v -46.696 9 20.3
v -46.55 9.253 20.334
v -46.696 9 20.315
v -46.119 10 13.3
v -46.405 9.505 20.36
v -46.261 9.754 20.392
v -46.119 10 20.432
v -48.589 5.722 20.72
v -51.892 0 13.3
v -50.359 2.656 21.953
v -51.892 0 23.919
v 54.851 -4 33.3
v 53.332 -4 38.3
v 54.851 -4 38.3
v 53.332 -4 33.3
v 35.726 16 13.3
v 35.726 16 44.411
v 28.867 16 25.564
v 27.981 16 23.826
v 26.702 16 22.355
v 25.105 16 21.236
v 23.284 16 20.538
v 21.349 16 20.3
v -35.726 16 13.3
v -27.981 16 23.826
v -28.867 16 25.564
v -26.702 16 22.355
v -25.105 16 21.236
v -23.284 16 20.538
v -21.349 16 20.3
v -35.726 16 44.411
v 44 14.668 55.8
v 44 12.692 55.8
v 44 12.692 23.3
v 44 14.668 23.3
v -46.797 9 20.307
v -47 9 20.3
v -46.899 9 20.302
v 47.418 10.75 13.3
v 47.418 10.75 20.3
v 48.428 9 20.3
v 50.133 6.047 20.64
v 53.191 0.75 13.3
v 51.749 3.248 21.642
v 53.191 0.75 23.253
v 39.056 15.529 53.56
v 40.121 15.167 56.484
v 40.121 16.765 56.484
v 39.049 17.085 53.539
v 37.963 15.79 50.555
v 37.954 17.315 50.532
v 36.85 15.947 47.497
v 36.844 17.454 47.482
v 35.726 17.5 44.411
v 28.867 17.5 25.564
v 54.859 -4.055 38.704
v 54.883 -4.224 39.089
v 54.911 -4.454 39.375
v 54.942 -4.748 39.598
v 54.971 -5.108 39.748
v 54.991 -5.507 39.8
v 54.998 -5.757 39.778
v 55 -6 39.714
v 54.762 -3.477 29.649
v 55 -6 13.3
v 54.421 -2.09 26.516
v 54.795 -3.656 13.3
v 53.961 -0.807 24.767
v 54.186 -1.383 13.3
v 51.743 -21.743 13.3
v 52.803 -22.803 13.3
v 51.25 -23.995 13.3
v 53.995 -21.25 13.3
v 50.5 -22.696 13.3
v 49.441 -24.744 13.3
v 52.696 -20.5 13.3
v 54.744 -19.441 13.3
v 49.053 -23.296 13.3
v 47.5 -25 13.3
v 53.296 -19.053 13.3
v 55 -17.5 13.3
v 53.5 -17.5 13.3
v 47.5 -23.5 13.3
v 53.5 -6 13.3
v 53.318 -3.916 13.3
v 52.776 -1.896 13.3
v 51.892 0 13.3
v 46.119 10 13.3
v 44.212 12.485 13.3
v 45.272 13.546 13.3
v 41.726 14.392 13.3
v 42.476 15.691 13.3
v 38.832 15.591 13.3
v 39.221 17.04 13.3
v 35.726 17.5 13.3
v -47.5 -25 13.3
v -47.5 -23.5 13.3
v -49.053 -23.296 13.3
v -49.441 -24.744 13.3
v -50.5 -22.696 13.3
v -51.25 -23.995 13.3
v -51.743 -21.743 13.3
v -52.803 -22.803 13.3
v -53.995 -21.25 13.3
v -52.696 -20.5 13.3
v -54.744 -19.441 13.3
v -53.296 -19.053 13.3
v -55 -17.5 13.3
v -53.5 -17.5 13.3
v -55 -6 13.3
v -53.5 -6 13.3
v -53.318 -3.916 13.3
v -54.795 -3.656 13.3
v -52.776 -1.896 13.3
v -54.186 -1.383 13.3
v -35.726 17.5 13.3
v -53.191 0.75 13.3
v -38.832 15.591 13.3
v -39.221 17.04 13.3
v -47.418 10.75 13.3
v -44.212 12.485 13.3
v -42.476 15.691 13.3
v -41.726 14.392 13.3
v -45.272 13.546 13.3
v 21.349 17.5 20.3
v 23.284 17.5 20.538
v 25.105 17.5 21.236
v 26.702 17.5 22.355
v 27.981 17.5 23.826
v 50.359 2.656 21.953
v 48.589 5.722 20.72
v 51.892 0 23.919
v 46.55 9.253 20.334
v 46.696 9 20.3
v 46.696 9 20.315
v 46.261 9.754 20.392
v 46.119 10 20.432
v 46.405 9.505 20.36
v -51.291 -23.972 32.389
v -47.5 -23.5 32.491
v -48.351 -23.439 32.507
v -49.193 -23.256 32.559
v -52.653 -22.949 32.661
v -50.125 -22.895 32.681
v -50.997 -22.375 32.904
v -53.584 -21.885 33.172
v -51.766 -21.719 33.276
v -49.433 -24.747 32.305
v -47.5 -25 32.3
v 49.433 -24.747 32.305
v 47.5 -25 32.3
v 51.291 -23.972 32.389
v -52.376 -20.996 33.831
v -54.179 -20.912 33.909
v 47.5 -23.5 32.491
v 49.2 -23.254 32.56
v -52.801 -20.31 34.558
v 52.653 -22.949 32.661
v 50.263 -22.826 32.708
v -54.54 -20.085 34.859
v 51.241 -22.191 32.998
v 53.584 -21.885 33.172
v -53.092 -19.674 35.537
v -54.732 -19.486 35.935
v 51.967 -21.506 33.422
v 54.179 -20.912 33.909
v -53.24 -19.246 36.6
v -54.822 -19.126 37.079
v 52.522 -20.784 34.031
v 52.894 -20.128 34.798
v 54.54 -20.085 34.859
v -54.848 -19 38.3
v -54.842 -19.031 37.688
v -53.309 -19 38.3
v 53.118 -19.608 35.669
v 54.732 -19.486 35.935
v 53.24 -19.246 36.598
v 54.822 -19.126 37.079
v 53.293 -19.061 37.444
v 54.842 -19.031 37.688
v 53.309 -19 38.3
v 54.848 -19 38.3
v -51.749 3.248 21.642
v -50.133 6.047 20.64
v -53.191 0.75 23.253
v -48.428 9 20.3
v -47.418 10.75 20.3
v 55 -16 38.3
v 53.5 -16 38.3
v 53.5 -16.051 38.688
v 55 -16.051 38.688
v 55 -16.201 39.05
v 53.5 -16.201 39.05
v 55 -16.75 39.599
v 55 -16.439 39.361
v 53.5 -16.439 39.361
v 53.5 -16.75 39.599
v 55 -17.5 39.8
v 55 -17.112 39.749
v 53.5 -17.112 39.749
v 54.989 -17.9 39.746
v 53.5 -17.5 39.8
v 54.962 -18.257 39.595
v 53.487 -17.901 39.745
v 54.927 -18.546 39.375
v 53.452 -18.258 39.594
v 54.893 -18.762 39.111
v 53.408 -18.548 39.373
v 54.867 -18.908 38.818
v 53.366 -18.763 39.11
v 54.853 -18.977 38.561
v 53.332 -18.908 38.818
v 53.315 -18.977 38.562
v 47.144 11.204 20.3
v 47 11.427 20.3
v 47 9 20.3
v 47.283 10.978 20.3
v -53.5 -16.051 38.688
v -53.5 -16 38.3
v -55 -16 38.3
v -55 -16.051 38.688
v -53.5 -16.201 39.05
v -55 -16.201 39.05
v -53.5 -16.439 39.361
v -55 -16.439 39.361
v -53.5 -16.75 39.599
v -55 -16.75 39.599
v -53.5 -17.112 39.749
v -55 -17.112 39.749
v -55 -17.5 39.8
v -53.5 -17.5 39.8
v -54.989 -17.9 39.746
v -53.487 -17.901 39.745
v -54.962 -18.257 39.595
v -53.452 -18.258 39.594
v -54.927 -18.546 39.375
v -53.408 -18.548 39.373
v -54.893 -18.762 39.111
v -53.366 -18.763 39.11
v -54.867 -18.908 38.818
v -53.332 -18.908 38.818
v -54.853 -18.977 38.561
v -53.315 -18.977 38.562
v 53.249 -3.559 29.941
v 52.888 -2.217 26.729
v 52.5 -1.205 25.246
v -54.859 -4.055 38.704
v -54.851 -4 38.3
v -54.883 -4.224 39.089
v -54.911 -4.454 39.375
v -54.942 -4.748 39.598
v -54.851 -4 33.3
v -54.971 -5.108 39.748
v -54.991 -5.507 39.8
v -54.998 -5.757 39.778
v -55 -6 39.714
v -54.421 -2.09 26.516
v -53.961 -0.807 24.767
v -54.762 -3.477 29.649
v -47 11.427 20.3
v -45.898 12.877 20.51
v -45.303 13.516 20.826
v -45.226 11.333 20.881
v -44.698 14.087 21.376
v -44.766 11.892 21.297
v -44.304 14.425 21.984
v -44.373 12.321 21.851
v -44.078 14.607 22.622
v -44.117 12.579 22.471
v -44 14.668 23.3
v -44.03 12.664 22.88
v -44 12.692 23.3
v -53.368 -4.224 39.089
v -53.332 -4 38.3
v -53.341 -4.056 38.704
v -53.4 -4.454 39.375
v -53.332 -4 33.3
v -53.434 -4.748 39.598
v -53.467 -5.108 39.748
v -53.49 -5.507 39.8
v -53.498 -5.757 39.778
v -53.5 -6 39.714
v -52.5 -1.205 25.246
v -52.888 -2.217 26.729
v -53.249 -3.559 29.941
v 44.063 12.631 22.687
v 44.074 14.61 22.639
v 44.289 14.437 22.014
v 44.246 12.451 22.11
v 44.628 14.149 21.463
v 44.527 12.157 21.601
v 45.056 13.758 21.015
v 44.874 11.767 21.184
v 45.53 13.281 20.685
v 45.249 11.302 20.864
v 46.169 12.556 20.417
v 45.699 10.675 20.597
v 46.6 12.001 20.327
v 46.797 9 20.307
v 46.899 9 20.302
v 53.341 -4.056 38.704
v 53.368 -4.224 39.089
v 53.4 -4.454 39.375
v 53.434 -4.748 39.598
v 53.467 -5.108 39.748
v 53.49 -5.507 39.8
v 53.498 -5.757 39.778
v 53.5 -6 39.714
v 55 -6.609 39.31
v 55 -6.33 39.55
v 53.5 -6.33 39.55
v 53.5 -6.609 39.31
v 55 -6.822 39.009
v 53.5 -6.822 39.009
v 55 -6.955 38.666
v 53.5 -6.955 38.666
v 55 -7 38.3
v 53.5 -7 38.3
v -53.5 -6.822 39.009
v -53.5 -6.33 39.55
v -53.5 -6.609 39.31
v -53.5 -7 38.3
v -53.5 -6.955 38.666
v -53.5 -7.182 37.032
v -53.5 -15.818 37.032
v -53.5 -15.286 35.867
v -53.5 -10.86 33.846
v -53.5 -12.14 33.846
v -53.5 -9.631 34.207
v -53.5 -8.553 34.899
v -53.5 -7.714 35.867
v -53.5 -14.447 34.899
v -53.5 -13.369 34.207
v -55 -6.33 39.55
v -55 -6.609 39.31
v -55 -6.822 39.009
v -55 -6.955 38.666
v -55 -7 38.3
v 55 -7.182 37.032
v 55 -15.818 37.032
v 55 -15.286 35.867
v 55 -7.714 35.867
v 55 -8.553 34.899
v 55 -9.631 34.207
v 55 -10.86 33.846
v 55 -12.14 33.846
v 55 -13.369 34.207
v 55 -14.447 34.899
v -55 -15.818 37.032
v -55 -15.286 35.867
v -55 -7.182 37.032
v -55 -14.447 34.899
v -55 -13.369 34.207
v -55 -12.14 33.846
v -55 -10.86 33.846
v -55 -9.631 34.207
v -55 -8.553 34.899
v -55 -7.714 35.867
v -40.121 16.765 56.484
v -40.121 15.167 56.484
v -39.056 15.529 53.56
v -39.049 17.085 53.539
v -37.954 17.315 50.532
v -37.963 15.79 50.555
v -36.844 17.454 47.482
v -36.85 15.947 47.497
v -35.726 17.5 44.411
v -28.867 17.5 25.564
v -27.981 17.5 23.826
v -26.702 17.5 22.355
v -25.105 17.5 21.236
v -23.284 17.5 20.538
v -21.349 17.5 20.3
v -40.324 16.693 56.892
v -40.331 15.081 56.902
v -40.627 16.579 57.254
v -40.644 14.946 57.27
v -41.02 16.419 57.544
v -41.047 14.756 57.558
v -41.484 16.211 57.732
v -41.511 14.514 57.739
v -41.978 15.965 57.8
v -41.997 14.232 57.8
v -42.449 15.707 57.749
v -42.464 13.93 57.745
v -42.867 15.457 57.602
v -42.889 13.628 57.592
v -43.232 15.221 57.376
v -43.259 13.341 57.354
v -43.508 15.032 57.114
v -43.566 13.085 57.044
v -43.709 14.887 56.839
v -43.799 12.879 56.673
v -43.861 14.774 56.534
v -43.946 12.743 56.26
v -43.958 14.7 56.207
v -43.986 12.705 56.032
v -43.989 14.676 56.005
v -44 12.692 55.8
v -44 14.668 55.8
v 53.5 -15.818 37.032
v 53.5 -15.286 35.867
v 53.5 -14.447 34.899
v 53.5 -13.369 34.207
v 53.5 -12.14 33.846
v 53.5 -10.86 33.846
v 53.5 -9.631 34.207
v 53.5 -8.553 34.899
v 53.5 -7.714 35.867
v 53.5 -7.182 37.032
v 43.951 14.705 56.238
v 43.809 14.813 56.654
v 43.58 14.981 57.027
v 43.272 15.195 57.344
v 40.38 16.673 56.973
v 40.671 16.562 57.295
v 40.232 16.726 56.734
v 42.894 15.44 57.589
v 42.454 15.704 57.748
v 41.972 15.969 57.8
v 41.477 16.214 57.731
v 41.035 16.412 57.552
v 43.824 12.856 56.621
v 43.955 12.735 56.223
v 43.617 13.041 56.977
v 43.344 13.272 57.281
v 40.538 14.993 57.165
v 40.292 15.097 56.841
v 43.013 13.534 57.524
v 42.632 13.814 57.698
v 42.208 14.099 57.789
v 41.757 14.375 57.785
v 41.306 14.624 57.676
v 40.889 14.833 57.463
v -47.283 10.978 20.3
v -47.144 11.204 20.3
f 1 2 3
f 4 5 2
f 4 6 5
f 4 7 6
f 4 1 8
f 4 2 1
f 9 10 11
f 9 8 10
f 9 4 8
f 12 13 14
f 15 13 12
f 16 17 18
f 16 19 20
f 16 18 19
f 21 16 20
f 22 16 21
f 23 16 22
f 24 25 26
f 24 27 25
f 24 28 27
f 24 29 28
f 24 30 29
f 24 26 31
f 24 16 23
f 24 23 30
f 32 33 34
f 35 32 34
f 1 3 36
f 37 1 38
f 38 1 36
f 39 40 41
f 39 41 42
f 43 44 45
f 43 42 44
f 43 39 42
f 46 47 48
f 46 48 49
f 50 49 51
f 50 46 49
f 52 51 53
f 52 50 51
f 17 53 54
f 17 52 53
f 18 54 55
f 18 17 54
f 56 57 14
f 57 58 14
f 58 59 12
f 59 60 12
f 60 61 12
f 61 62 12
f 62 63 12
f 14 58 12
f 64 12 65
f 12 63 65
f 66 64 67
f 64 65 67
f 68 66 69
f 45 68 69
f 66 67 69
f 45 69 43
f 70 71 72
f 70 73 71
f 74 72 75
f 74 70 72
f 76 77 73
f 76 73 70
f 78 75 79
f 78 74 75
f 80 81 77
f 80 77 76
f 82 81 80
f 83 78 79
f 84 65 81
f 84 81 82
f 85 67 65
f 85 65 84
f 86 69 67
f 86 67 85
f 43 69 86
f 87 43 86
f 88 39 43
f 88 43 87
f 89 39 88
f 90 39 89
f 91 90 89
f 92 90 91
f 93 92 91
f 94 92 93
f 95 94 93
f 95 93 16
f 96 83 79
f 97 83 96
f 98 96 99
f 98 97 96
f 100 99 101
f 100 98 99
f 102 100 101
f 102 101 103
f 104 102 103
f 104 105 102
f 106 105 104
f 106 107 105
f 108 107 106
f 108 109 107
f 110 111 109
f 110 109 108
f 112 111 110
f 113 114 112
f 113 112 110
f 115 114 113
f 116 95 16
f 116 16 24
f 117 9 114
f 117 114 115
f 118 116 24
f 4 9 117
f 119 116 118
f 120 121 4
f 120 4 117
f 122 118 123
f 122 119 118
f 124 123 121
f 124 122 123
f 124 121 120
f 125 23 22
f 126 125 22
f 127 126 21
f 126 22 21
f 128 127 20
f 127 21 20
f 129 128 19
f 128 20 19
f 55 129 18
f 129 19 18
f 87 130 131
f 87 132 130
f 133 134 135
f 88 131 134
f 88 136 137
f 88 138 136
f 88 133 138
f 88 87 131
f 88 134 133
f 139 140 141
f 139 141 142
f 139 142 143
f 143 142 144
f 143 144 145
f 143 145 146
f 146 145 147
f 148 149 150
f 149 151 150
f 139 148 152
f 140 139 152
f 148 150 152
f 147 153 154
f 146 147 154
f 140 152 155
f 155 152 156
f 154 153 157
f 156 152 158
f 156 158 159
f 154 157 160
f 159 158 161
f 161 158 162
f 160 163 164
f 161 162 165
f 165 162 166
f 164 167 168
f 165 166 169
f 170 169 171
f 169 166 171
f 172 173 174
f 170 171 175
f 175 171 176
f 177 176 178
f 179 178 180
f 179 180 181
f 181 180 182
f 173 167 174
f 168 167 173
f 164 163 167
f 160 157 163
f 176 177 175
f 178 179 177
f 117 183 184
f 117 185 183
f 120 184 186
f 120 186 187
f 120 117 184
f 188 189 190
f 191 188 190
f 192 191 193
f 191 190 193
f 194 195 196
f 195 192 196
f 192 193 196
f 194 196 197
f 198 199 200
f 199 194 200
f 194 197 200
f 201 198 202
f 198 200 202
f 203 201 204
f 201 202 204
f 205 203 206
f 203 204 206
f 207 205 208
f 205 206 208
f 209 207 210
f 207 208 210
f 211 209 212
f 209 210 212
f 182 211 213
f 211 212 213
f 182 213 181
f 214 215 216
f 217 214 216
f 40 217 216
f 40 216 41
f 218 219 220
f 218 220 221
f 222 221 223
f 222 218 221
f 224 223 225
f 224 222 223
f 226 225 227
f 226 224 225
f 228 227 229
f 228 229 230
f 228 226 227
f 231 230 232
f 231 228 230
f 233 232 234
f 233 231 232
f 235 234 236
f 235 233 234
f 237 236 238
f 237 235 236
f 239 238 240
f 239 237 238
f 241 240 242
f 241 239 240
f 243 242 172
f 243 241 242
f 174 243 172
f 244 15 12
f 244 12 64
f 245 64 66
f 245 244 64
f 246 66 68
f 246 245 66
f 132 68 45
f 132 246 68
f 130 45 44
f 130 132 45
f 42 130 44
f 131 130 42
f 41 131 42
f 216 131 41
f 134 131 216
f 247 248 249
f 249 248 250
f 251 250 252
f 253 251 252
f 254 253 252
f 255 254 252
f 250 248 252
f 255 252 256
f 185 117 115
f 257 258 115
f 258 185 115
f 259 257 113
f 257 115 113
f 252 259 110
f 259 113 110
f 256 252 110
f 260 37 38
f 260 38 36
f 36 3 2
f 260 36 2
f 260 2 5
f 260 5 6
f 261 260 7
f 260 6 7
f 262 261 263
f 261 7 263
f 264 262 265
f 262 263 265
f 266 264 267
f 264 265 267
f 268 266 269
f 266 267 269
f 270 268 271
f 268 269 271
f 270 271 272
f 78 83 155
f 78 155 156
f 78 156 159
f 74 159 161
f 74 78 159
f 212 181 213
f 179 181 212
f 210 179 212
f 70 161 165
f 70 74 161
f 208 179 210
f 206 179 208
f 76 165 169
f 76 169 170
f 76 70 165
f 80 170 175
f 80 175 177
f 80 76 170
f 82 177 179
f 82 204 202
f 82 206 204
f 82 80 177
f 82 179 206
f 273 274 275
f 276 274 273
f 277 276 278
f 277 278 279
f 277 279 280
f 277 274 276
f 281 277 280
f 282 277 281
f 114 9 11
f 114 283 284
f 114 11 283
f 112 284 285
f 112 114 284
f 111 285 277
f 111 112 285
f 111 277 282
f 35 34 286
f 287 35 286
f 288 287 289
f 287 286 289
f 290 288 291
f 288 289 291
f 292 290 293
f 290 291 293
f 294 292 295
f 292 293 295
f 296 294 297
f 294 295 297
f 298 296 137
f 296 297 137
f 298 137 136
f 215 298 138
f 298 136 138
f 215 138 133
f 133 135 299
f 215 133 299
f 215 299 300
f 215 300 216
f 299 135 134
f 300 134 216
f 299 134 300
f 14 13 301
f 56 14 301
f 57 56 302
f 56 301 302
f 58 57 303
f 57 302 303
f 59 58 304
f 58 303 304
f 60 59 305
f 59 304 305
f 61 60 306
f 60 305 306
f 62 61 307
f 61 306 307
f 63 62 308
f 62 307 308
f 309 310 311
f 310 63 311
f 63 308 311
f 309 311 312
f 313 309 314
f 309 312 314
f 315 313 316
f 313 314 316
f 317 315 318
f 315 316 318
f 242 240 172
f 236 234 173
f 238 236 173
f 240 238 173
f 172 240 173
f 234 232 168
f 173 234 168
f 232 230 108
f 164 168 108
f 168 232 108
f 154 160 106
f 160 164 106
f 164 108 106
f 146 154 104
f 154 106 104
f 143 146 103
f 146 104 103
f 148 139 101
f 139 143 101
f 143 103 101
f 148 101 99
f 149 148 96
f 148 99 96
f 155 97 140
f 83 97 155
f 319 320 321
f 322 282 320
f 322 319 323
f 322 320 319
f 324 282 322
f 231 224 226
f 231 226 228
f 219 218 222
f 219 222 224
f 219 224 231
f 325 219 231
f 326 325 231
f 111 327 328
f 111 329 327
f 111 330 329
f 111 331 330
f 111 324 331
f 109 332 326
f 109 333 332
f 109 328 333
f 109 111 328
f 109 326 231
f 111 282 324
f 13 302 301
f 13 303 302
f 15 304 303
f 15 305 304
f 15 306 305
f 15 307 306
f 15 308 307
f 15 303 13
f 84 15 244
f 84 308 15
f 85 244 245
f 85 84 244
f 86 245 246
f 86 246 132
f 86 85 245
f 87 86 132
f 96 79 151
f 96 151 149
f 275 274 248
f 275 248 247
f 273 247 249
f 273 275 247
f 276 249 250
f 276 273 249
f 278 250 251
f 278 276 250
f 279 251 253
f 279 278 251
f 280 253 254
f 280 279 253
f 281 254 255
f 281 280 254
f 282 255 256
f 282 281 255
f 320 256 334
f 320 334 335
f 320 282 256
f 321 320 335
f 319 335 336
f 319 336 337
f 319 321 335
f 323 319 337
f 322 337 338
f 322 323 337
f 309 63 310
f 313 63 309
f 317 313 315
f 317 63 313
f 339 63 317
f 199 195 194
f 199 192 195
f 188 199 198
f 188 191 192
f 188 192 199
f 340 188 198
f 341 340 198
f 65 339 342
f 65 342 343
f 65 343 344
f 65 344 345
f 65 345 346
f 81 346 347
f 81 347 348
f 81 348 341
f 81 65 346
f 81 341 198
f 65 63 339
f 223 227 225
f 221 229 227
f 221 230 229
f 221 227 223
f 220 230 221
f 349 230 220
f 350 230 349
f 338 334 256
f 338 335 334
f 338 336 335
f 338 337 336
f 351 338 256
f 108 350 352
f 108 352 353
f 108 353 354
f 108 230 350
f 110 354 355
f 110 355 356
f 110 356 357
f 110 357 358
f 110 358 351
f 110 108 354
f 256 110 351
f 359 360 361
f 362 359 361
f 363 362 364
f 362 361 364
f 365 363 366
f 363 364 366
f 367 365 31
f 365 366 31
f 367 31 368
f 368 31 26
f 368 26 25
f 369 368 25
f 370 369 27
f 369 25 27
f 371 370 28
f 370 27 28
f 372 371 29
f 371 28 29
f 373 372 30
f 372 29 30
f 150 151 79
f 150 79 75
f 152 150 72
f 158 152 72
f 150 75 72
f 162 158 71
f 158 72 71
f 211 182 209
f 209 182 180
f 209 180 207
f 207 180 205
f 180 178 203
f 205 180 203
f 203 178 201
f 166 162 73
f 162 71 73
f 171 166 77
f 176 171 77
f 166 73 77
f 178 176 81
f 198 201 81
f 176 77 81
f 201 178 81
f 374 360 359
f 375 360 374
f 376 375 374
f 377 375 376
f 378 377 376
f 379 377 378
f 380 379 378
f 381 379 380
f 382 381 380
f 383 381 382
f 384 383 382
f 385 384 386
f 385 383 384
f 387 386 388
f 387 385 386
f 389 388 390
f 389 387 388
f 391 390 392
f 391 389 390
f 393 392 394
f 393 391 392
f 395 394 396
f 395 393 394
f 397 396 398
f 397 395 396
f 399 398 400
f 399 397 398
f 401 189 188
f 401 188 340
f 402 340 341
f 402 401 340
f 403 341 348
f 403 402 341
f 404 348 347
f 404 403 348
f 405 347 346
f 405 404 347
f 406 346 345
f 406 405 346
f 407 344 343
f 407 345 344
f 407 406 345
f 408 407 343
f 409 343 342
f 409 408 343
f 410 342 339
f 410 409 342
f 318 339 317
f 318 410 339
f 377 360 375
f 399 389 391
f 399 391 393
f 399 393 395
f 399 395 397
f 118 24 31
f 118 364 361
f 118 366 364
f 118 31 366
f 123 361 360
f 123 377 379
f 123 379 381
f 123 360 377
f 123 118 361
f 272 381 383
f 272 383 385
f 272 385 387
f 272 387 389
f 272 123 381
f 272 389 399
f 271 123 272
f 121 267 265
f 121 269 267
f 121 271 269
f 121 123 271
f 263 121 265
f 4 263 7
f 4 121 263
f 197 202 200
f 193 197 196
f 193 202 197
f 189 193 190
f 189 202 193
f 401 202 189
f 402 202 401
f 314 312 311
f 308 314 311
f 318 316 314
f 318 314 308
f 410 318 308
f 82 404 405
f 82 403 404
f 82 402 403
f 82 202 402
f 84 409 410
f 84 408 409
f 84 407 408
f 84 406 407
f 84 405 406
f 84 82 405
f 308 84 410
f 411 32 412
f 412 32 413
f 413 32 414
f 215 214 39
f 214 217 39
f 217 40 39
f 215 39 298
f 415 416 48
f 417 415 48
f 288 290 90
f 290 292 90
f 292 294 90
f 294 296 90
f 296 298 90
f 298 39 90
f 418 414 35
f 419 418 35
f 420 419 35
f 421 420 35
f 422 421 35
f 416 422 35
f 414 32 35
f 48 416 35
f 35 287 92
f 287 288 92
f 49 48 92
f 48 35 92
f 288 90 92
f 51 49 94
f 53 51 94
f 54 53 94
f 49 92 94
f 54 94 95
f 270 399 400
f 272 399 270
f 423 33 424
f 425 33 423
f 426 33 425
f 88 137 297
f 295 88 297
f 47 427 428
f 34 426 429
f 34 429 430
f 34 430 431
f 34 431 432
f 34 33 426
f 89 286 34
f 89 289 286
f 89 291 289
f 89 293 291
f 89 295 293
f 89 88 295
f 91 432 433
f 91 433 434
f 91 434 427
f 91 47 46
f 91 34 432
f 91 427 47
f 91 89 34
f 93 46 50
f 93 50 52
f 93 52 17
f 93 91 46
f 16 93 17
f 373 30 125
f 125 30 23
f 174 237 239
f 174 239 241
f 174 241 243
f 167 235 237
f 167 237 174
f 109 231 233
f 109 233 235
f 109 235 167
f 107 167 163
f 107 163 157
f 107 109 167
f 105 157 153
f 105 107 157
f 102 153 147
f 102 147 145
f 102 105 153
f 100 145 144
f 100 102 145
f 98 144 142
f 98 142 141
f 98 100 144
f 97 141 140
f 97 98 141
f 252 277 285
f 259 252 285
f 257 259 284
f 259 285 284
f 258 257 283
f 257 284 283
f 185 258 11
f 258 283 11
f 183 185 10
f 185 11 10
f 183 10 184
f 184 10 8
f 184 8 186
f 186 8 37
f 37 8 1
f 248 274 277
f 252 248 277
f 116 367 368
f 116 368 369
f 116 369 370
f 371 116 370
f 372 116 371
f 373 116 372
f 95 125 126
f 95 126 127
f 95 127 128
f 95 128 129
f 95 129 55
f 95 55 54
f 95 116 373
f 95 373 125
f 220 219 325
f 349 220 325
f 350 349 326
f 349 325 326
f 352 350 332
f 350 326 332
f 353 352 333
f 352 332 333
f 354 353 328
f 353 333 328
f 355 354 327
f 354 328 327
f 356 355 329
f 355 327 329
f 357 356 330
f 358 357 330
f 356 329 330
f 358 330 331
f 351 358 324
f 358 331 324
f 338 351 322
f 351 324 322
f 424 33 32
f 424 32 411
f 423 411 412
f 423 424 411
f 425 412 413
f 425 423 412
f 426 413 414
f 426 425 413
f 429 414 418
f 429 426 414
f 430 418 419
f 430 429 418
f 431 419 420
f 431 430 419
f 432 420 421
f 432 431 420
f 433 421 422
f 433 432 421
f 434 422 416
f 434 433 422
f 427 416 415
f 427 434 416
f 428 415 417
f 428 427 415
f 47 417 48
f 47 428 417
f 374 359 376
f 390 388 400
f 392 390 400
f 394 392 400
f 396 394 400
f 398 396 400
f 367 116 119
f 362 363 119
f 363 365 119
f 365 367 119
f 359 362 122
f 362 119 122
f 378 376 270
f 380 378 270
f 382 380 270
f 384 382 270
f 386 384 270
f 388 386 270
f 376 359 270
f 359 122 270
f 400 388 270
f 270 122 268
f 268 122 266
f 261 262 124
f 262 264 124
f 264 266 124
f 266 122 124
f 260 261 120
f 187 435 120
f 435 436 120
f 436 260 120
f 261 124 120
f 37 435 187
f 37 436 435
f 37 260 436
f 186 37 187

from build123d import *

# Parameters (mm, degrees)
PAD041_DEPTH         = 45
POCKET020_DEPTH      = 55.001
POCKET020_DEPTH_BACK = 55.001
POCKET021_DEPTH      = 8.501


with BuildPart() as part:
    # Sketch123 → Pad041 (new body)
    with BuildSketch(Plane.XY):
        with BuildLine():
            Line((-55, -17.5), (-55, -6))
            ThreePointArc((-53.191343, 0.75), (-54.539999, -2.505943), (-55, -6))
            Line((-53.191343, 0.75), (-47.41784, 10.75))
            ThreePointArc((-35.726497, 17.5), (-42.476497, 15.691343), (-47.41784, 10.75))
            Line((-35.726497, 17.5), (35.726497, 17.5))
            ThreePointArc((47.41784, 10.75), (42.476497, 15.691343), (35.726497, 17.5))
            Line((47.41784, 10.75), (53.191343, 0.75))
            ThreePointArc((55, -6), (54.539999, -2.505943), (53.191343, 0.75))
            Line((55, -6), (55, -17.5))
            ThreePointArc((47.5, -25), (52.803301, -22.803301), (55, -17.5))
            Line((47.5, -25), (-47.5, -25))
            ThreePointArc((-55, -17.5), (-52.803301, -22.803301), (-47.5, -25))
        make_face()
        with BuildLine():
            Line((53.5, -17.5), (53.5, -6))
            ThreePointArc((53.5, -6), (53.09111, -2.894171), (51.892305, 0))
            Line((51.892305, 0), (46.118802, 10))
            ThreePointArc((46.118802, 10), (41.726497, 14.392305), (35.726497, 16))
            Line((35.726497, 16), (-35.726497, 16))
            ThreePointArc((-35.726497, 16), (-41.726497, 14.392305), (-46.118802, 10))
            Line((-46.118802, 10), (-51.892305, 0))
            ThreePointArc((-51.892305, 0), (-53.09111, -2.894171), (-53.5, -6))
            Line((-53.5, -6), (-53.5, -17.5))
            ThreePointArc((-53.5, -17.5), (-51.742641, -21.742641), (-47.5, -23.5))
            Line((-47.5, -23.5), (47.5, -23.5))
            ThreePointArc((47.5, -23.5), (51.742641, -21.742641), (53.5, -17.5))
        make_face(mode=Mode.SUBTRACT)
    extrude(amount=PAD041_DEPTH)

    # Sketch124 → Pocket020 (cut, two sides)
    with BuildSketch(Plane.YZ) as pocket020_sk:
        with BuildLine():
            ThreePointArc((-16, 25), (-11.5, 20.5), (-7, 25))
            ThreePointArc((-4, 25), (-5.5, 26.5), (-7, 25))
            Line((-4, 25), (-4, 20))
            ThreePointArc((-4, 20), (-0.192388, 10.807612), (9, 7))
            Line((9, 50), (9, 7))
            Line((-26.5, 50), (9, 50))
            Line((-26.5, 20.5), (-26.5, 50))
            ThreePointArc((-26.5, 20.5), (-26.06066, 19.43934), (-25, 19))
            ThreePointArc((-25, 19), (-20.757359, 20.757359), (-19, 25))
            ThreePointArc((-16, 25), (-17.5, 26.5), (-19, 25))
        make_face()
    extrude(amount=-POCKET020_DEPTH, mode=Mode.SUBTRACT)
    extrude(pocket020_sk.sketch, amount=POCKET020_DEPTH_BACK, mode=Mode.SUBTRACT)

    # Sketch125 (on DatumPlane) → Pocket021 (cut, through all)
    with BuildSketch(Plane(origin=(0, 9, 7), x_dir=(1, 0, 0), z_dir=(0, -1, 0))):
        with BuildLine():
            ThreePointArc((44, 35.5), (42.347296, 37.469616), (40.120615, 36.18404))
            Line((40.120615, 36.18404), (28.866582, 5.263839))
            ThreePointArc((21.349041, 0), (25.937652, 1.446784), (28.866582, 5.263839))
            Line((-21.349041, 0), (21.349041, 0))
            ThreePointArc((-28.866582, 5.263839), (-25.937652, 1.446784), (-21.349041, 0))
            Line((-40.120615, 36.18404), (-28.866582, 5.263839))
            ThreePointArc((-40.120615, 36.18404), (-42.347296, 37.469616), (-44, 35.5))
            Line((-44, 35.5), (-44, 3))
            ThreePointArc((-47, 0), (-44.87868, 0.87868), (-44, 3))
            Line((-47, 0), (-65, 0))
            ThreePointArc((65, 0), (0, 65), (-65, 0))
            Line((47, 0), (65, 0))
            ThreePointArc((44, 3), (44.87868, 0.87868), (47, 0))
            Line((44, 35.5), (44, 3))
        make_face()
    extrude(amount=-POCKET021_DEPTH, mode=Mode.SUBTRACT)


with BuildPart() as part_1:
    # Body020 placement: moved
    add(part.part.moved(Location((0, 0, 13.3))))


solid = part_1.part
